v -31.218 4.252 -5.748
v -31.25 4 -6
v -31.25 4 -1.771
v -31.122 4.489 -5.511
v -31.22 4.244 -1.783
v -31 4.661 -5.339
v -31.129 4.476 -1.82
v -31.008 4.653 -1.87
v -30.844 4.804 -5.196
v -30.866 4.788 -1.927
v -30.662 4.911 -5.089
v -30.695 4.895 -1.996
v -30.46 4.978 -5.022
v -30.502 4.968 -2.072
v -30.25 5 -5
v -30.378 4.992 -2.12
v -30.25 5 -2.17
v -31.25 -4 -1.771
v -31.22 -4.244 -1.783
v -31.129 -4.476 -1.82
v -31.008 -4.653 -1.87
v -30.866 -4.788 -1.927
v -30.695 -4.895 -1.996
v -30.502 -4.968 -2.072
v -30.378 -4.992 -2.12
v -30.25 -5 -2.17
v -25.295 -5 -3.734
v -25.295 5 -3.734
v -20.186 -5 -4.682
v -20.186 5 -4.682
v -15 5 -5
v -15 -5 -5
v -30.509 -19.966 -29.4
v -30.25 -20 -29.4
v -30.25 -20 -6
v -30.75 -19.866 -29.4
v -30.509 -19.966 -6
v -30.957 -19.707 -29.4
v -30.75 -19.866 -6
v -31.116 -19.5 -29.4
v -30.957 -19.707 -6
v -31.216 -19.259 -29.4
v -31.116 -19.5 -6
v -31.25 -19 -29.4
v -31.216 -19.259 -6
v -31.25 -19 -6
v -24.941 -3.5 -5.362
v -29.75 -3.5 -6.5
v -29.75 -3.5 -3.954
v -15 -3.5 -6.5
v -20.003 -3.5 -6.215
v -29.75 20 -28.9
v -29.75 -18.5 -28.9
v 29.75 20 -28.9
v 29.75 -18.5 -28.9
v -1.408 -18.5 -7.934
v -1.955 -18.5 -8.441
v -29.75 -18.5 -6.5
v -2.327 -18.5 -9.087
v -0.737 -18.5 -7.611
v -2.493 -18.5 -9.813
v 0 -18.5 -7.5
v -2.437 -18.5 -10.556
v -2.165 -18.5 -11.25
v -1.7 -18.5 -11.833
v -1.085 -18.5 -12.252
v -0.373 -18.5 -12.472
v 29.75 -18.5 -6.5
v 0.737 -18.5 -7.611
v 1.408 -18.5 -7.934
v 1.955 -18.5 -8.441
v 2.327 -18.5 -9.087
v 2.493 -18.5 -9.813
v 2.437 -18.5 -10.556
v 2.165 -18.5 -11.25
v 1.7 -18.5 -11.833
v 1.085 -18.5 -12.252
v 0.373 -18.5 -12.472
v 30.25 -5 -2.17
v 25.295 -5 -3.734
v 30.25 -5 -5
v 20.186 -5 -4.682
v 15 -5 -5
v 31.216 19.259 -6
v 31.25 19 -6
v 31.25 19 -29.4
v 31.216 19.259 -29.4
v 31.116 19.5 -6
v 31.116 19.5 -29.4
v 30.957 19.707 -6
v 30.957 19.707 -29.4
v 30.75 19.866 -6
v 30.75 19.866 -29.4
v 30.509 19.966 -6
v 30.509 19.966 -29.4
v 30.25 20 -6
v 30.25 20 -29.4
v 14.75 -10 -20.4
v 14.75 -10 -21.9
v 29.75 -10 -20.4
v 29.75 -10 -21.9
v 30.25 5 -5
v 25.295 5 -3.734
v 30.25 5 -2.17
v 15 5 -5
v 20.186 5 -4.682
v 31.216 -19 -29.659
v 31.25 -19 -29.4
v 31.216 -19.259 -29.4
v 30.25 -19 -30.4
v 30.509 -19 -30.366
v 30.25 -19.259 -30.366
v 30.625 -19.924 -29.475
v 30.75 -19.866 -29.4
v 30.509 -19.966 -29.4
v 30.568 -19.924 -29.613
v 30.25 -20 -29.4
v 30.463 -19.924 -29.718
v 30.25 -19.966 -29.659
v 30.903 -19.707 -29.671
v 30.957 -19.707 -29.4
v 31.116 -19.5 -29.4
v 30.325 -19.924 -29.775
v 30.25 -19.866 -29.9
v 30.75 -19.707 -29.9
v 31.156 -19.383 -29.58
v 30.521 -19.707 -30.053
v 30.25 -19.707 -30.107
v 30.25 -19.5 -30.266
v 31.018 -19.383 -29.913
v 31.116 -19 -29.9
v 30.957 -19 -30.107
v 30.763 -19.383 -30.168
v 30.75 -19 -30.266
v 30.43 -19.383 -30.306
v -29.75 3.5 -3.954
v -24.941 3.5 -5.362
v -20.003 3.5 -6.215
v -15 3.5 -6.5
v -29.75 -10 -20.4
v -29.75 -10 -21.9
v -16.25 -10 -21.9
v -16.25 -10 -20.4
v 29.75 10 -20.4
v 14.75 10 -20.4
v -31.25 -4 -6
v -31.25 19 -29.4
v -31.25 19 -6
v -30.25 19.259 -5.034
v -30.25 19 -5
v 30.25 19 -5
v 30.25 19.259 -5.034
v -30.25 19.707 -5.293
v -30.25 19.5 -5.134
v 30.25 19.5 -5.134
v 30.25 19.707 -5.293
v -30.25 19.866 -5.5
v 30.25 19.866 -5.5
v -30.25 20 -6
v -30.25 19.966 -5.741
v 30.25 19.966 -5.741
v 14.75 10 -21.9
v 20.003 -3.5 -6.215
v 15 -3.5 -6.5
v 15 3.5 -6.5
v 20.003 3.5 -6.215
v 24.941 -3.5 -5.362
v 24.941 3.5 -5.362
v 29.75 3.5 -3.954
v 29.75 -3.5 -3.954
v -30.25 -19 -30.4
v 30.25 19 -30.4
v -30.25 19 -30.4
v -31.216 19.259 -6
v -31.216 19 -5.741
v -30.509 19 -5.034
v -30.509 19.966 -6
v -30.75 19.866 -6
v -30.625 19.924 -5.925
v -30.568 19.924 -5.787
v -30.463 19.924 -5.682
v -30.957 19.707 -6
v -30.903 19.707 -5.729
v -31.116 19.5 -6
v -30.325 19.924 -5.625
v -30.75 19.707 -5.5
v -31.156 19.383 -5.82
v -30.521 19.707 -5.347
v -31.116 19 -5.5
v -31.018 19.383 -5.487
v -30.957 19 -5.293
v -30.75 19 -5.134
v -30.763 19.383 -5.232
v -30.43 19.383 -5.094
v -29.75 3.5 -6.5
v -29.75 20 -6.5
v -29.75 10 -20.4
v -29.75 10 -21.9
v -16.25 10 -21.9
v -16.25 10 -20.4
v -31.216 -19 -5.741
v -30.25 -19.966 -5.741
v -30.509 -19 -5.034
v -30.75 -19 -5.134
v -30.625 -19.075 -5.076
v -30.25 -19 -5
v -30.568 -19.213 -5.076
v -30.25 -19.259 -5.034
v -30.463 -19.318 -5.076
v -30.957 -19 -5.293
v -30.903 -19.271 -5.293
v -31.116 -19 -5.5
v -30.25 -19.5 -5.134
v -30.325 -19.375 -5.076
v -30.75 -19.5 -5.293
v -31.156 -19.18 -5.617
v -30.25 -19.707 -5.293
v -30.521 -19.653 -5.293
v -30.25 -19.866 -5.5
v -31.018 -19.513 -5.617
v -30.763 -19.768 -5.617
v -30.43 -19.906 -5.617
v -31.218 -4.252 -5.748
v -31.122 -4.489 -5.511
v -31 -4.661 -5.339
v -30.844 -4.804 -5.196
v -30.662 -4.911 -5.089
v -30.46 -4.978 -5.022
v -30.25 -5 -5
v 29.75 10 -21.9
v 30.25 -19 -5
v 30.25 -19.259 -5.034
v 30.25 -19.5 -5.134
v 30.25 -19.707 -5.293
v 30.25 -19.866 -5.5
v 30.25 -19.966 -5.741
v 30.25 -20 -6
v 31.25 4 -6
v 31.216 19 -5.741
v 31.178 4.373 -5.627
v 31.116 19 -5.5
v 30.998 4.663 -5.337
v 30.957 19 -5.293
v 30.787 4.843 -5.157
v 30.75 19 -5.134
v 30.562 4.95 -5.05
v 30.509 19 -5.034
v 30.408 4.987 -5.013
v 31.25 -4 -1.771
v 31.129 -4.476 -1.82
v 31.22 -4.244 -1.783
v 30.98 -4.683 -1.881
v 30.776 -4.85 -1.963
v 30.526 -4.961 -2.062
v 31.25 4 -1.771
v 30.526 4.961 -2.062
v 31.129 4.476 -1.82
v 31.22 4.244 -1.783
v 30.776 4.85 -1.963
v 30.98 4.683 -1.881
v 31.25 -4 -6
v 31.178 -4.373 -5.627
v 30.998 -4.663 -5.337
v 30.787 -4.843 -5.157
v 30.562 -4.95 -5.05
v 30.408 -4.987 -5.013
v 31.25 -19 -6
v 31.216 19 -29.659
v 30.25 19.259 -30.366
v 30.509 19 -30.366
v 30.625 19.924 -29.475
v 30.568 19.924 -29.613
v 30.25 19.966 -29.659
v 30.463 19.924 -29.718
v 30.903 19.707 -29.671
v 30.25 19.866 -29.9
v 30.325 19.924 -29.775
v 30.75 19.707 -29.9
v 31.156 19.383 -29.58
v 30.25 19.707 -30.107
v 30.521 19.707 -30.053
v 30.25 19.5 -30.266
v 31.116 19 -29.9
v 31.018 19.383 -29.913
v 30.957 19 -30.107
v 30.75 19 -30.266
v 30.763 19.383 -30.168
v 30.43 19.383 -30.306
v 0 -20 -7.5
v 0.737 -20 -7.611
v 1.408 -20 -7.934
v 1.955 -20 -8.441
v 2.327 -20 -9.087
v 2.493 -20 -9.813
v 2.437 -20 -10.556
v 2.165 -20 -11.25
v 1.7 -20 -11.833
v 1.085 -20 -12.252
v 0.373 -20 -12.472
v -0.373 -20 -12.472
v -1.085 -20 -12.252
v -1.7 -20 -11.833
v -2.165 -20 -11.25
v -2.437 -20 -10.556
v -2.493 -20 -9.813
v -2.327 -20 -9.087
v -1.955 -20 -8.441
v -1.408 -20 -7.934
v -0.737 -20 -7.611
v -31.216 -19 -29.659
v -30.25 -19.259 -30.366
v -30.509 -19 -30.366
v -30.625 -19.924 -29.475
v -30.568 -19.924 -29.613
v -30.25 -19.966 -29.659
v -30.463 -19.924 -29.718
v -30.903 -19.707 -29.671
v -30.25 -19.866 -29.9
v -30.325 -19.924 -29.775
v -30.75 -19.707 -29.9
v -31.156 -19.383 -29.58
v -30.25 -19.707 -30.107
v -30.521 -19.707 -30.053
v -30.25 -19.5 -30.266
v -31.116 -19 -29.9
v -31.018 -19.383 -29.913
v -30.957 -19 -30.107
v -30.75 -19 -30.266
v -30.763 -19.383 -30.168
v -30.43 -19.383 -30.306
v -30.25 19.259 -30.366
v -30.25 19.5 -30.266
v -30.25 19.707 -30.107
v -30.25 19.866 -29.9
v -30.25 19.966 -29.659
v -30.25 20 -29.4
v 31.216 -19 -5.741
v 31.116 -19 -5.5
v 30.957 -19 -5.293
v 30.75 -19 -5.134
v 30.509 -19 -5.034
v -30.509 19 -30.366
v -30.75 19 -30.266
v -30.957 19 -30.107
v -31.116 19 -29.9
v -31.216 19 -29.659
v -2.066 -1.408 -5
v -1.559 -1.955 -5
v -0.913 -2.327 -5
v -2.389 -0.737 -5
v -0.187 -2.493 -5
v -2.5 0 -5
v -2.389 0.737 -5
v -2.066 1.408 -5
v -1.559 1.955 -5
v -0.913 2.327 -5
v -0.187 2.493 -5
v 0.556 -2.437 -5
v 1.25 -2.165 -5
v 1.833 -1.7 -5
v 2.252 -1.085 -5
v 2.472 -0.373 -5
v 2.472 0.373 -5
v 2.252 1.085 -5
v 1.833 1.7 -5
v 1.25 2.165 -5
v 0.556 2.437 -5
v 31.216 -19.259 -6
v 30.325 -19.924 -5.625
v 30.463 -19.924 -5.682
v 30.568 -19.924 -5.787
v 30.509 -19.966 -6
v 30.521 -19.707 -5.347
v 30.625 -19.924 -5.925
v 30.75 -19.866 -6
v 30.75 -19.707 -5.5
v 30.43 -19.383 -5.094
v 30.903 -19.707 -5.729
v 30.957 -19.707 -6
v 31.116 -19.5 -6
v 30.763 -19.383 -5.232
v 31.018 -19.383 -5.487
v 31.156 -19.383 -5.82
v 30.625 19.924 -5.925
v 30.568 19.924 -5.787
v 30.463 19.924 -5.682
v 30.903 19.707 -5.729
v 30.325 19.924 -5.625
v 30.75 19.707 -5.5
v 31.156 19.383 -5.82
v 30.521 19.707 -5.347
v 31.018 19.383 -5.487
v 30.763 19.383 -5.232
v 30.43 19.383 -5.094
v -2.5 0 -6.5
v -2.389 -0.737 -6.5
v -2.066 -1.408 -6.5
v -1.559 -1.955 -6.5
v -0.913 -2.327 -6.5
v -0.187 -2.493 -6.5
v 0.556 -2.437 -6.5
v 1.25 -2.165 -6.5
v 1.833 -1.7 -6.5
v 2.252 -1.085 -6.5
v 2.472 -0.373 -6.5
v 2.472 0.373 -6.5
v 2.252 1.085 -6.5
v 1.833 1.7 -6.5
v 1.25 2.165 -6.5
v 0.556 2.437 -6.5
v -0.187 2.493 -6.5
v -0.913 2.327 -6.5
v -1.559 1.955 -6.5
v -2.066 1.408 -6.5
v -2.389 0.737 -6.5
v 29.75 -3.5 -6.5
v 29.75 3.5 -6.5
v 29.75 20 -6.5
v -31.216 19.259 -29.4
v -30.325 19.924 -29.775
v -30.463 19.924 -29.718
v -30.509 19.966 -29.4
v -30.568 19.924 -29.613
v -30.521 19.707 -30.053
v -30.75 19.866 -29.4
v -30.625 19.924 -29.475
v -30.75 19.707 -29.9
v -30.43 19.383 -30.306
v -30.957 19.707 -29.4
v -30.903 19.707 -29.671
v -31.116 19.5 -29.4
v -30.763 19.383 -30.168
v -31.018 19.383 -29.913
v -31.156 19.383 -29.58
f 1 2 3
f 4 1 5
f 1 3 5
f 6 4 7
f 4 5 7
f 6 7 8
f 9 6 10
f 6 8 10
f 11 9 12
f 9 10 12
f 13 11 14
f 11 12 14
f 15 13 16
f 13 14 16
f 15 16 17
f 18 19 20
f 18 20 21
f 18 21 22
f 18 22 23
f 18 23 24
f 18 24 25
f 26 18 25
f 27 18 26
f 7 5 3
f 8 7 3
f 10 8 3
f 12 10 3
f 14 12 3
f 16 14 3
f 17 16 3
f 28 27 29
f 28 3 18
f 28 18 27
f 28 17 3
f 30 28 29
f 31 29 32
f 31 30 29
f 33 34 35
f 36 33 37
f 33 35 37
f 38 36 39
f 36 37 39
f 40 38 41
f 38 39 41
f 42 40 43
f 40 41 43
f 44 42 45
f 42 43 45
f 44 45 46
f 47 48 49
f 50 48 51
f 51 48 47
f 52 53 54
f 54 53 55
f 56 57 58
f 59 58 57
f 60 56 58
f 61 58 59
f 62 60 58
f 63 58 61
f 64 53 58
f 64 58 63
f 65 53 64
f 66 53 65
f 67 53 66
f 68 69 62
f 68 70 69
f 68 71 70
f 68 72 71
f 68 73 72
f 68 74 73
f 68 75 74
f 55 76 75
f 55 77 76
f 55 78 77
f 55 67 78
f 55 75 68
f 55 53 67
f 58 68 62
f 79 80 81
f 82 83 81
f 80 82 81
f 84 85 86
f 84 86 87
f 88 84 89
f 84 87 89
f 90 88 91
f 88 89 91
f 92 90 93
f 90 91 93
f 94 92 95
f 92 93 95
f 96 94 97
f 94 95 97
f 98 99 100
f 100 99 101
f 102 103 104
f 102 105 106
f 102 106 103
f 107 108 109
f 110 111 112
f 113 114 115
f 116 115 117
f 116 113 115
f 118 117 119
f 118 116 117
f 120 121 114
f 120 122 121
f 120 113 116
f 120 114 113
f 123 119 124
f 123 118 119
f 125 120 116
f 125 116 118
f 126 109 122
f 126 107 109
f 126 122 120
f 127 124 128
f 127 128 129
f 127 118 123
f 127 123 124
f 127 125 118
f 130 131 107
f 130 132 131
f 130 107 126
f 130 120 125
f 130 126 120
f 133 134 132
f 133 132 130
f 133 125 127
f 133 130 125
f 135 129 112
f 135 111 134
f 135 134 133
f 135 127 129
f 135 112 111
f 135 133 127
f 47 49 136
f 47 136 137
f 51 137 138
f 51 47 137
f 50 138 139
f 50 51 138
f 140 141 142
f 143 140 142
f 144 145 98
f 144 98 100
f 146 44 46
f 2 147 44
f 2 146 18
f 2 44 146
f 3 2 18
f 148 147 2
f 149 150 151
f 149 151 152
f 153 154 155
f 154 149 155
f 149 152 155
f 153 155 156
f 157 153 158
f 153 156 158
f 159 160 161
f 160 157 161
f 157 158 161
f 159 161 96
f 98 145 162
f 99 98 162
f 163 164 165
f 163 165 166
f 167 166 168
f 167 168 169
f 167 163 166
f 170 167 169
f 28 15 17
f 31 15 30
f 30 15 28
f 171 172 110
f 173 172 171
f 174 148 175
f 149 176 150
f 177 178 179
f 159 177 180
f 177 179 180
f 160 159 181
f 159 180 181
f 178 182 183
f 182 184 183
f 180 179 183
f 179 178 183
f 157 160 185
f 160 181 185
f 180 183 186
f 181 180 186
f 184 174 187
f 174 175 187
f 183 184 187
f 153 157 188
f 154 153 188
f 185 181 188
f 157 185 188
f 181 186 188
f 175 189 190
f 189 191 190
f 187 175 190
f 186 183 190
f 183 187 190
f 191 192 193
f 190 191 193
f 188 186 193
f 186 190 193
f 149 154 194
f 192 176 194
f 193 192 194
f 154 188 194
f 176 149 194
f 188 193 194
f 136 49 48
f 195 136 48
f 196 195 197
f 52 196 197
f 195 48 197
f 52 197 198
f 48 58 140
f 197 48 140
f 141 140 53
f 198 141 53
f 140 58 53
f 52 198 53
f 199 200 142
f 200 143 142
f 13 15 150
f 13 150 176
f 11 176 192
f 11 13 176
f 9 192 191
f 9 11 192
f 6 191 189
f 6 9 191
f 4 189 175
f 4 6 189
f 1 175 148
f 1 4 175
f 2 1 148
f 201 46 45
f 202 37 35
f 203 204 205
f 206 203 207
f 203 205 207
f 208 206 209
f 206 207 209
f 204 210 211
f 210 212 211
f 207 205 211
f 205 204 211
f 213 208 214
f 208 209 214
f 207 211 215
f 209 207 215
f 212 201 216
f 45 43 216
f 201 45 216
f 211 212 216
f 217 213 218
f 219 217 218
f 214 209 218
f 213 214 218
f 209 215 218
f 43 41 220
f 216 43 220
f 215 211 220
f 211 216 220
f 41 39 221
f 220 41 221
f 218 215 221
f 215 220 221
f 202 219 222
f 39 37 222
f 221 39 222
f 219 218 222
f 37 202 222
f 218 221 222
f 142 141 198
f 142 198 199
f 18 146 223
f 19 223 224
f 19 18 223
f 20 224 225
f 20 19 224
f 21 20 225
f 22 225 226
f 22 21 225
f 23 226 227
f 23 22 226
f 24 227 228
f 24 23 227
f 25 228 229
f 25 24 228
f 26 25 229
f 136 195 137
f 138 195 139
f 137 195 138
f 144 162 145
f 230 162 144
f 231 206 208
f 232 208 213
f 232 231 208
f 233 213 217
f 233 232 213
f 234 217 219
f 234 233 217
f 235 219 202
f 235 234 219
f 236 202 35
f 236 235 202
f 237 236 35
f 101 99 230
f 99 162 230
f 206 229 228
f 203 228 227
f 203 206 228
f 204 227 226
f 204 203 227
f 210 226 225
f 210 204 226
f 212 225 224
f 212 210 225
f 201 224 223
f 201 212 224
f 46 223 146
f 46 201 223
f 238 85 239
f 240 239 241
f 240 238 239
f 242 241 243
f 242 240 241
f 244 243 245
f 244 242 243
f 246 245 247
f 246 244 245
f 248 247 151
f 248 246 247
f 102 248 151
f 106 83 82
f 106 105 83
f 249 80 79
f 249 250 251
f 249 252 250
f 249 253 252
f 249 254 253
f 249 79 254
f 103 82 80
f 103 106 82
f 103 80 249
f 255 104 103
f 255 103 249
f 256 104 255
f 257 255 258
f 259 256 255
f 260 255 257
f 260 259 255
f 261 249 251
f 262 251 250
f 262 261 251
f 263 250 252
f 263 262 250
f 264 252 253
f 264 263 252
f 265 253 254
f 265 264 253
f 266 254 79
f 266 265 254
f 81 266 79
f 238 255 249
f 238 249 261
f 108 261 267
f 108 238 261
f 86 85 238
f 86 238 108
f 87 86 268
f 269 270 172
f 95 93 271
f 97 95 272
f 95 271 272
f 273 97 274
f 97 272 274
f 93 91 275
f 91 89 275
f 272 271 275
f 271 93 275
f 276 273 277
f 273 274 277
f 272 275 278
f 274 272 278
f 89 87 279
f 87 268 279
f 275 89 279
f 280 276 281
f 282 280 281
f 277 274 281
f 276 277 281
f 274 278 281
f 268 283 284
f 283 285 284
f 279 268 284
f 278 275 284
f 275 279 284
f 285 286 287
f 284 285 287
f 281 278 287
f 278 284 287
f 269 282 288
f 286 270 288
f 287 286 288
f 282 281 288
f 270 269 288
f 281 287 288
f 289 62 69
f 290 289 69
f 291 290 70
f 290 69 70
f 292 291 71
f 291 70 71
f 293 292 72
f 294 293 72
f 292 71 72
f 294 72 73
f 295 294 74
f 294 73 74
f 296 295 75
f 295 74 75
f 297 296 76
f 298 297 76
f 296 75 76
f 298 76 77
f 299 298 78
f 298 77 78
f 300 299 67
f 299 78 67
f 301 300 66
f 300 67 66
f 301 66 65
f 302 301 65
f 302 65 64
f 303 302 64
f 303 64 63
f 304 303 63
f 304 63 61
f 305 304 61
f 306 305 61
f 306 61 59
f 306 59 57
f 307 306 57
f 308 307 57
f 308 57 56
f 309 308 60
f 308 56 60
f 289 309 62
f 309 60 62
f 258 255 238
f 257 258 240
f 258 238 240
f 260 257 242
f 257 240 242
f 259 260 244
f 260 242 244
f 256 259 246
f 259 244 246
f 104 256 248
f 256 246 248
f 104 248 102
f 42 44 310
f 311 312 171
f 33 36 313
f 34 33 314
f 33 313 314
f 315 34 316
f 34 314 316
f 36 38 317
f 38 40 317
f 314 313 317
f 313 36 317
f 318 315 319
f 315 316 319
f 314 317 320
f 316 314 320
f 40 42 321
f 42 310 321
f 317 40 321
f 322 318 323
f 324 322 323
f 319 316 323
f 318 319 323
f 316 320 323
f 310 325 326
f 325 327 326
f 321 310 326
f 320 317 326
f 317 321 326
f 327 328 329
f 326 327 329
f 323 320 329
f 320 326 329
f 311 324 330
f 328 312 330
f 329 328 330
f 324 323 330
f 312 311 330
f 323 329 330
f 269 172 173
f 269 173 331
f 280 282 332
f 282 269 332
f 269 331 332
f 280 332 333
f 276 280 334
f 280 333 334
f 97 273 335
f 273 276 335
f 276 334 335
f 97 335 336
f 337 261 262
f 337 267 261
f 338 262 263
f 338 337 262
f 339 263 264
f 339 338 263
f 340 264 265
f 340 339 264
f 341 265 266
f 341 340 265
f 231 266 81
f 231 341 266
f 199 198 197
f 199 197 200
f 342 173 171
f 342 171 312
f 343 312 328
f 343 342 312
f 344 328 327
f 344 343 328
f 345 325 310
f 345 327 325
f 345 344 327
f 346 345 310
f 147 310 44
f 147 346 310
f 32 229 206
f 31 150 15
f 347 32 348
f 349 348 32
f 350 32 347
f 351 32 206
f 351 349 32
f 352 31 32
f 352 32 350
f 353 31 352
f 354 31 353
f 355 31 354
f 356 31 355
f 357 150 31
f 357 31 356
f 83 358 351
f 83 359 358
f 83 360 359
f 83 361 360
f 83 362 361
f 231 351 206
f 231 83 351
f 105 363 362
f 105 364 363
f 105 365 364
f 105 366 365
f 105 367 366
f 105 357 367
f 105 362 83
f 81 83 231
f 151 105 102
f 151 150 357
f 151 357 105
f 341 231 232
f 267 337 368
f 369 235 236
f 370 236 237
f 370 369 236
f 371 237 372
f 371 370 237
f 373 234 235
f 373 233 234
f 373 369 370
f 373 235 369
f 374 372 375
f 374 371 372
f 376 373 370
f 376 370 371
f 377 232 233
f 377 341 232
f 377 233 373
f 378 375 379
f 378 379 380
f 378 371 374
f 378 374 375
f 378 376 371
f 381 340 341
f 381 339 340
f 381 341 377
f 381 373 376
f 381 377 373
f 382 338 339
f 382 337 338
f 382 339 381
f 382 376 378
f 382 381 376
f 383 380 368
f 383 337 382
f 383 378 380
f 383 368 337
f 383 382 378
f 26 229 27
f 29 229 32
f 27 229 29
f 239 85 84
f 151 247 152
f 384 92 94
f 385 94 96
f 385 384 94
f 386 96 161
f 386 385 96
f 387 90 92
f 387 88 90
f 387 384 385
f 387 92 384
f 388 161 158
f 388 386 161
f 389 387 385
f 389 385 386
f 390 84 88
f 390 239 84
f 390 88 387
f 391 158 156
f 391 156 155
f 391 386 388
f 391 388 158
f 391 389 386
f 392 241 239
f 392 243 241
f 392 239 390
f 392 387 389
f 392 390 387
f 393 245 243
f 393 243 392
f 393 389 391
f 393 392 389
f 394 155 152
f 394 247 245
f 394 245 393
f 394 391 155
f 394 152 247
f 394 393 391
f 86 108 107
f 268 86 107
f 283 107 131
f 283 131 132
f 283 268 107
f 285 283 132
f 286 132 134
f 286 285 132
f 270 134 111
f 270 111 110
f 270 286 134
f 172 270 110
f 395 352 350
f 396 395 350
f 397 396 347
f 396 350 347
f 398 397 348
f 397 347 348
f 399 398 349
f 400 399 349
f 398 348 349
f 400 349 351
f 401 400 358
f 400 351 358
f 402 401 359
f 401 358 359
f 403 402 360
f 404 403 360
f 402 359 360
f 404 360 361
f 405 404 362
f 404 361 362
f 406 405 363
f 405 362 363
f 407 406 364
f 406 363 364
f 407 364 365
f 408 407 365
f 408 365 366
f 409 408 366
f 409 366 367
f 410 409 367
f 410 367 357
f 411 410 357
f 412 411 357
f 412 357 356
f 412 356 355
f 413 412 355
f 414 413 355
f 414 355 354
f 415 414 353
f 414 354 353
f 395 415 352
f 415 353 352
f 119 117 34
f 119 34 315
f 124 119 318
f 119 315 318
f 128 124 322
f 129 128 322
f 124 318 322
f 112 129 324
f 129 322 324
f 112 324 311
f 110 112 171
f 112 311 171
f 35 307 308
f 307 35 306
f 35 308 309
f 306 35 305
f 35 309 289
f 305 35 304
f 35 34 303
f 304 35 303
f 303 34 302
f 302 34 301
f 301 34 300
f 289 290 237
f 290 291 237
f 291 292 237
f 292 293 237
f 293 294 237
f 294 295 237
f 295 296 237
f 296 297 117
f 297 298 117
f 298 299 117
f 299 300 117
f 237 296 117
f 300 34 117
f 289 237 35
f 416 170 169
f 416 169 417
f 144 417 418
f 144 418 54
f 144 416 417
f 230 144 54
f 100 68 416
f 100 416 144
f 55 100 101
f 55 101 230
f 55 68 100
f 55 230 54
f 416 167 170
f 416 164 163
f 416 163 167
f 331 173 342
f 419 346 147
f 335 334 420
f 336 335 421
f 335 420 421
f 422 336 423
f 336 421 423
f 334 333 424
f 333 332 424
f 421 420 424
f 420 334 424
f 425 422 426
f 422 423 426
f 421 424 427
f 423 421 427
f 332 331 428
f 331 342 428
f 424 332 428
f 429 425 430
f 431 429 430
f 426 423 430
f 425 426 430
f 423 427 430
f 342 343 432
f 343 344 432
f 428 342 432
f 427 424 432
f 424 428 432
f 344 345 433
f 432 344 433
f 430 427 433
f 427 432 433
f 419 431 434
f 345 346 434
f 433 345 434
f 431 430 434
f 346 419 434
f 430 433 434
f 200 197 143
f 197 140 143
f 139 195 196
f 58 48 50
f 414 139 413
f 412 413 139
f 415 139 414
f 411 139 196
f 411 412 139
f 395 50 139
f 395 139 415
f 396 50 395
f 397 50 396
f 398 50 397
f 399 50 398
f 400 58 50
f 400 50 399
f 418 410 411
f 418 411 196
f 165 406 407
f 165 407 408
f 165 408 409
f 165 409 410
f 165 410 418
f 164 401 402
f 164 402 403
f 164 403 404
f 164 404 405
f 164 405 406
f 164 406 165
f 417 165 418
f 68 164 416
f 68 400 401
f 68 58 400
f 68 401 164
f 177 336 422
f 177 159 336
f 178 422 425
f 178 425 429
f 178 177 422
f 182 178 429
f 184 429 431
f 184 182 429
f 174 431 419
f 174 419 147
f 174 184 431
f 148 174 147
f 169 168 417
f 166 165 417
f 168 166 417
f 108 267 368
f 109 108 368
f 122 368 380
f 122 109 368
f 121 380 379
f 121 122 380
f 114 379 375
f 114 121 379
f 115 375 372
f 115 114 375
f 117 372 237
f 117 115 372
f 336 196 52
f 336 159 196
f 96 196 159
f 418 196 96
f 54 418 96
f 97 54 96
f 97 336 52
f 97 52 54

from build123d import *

# Parameters (mm, degrees)
BOSS_EXTRUDE1_DEPTH = 5
BOSS_EXTRUDE2_DEPTH = 20
SHELL1_START        = -18.5
SHELL1_OUTLINE_W    = 59.5
SHELL1_OUTLINE_H    = 22.4
SHELL1_DEPTH        = 38.5
SHELL1_START_2      = -3.5
SHELL1_2_DEPTH      = 7
SKETCH14_R          = 2.5
CUT_EXTRUDE1_DEPTH  = 1.5
SKETCH15_W          = 13.5
SKETCH15_H          = 1.5
SKETCH15_W_2        = 15
BOSS_EXTRUDE3_DEPTH = 10
FILLET21_R          = 1
CUT_EXTRUDE2_START  = -18.5
SKETCH16_R          = 2.5
CUT_EXTRUDE2_DEPTH  = 1.5


# Read off the part's stored shape, not the designer's step: Shell1
with BuildPart() as part:
    # Sketch13 → Boss-Extrude1 (new, symmetric)
    with BuildSketch(Plane(origin=(0, 0, 0), x_dir=(1, 0, 0), z_dir=(0, 1, 0))):
        with BuildLine():
            ThreePointArc((-31.25, 1.770695181), (-23.283883594, 4.184856634), (-15, 5))
            Line((-15, 5), (-31.25, 5))
            Line((-31.25, 5), (-31.25, 1.770695181))
        make_face()
        Polygon((-15, 5), (15, 5), (31.25, 5), (31.25, 30.4), (-31.25, 30.4), (-31.25, 5), align=None)
        with BuildLine():
            Line((31.25, 5), (15, 5))
            ThreePointArc((15, 5), (23.283883594, 4.184856634), (31.25, 1.770695181))
            Line((31.25, 1.770695181), (31.25, 5))
        make_face()
    extrude(amount=BOSS_EXTRUDE1_DEPTH, both=True)

    # Sketch13<12> → Boss-Extrude2 (add, symmetric)
    with BuildSketch(Plane(origin=(0, 0, 0), x_dir=(1, 0, 0), z_dir=(0, 1, 0))):
        Polygon((-15, 5), (15, 5), (31.25, 5), (31.25, 30.4), (-31.25, 30.4), (-31.25, 5), align=None)
    extrude(amount=BOSS_EXTRUDE2_DEPTH, both=True)

    # Shell1 outline → Shell1 (cut)
    with BuildSketch(Plane(origin=(0, 0, 0), x_dir=(1, 0, 0), z_dir=(0, 1, 0)).offset(SHELL1_START)):
        with Locations((0, 17.7)):
            Rectangle(SHELL1_OUTLINE_W, SHELL1_OUTLINE_H)
    extrude(amount=SHELL1_DEPTH, mode=Mode.SUBTRACT)

    # Shell1 2 outline → Shell1 2 (cut)
    with BuildSketch(Plane(origin=(0, 0, 0), x_dir=(1, 0, 0), z_dir=(0, 1, 0)).offset(SHELL1_START_2)):
        with BuildLine():
            Line((-29.75, 6.5), (-29.75, 3.954040816))
            ThreePointArc((-29.75, 3.954040816), (-22.484056523, 5.858838752), (-15, 6.5))
            Line((-15, 6.5), (-29.75, 6.5))
        make_face()
        with BuildLine():
            Line((29.75, 6.5), (15, 6.5))
            ThreePointArc((15, 6.5), (22.484056523, 5.858838752), (29.75, 3.954040816))
            Line((29.75, 3.954040816), (29.75, 6.5))
        make_face()
    extrude(amount=SHELL1_2_DEPTH, mode=Mode.SUBTRACT)

    # Sketch14 → Cut-Extrude1 (cut)
    with BuildSketch(Plane.XY.offset(-5)):
        with Locations(Location((0, 0, 0), (0, 0, 180))):
            Circle(SKETCH14_R)
    extrude(amount=-CUT_EXTRUDE1_DEPTH, mode=Mode.SUBTRACT)

    # Sketch15 → Boss-Extrude3 (add, symmetric)
    with BuildSketch(Plane(origin=(0, 0, 0), x_dir=(1, 0, 0), z_dir=(0, 1, 0))):
        with Locations((-23, 21.15)):
            Rectangle(SKETCH15_W, SKETCH15_H)
        with Locations((22.25, 21.15)):
            Rectangle(SKETCH15_W_2, SKETCH15_H)
    extrude(amount=BOSS_EXTRUDE3_DEPTH, both=True)

    # Fillet21
    fillet21_edges = [part.edges().sort_by_distance(p)[0] for p in [
        (-31.25, 0, -30.4),
        (31.25, 0, -30.4),
        (31.25, -5, -3.385347591),
        (31.25, 5, -3.385347591),
        (31.25, -12.5, -5),
        (-31.25, -20, -17.7),
        (-31.25, -12.5, -5),
        (0, -20, -5),
        (31.25, 12.5, -5),
        (31.25, 20, -17.7),
        (0, 20, -30.4),
        (-31.25, 12.5, -5),
        (-31.25, 20, -17.7),
        (0, 20, -5),
        (31.25, -20, -17.7),
        (0, -20, -30.4),
        (-31.25, 5, -3.385347591),
        (-31.25, -5, -3.385347591),
    ]]
    fillet(fillet21_edges, radius=FILLET21_R)

    # Sketch16 → Cut-Extrude2 (cut)
    with BuildSketch(Plane(origin=(0, 0, 0), x_dir=(1, 0, 0), z_dir=(0, 1, 0)).offset(CUT_EXTRUDE2_START)):
        with Locations(Location((0, 10, 0), (0, 0, 270))):
            Circle(SKETCH16_R)
    extrude(amount=-CUT_EXTRUDE2_DEPTH, mode=Mode.SUBTRACT)


solid = part.part
